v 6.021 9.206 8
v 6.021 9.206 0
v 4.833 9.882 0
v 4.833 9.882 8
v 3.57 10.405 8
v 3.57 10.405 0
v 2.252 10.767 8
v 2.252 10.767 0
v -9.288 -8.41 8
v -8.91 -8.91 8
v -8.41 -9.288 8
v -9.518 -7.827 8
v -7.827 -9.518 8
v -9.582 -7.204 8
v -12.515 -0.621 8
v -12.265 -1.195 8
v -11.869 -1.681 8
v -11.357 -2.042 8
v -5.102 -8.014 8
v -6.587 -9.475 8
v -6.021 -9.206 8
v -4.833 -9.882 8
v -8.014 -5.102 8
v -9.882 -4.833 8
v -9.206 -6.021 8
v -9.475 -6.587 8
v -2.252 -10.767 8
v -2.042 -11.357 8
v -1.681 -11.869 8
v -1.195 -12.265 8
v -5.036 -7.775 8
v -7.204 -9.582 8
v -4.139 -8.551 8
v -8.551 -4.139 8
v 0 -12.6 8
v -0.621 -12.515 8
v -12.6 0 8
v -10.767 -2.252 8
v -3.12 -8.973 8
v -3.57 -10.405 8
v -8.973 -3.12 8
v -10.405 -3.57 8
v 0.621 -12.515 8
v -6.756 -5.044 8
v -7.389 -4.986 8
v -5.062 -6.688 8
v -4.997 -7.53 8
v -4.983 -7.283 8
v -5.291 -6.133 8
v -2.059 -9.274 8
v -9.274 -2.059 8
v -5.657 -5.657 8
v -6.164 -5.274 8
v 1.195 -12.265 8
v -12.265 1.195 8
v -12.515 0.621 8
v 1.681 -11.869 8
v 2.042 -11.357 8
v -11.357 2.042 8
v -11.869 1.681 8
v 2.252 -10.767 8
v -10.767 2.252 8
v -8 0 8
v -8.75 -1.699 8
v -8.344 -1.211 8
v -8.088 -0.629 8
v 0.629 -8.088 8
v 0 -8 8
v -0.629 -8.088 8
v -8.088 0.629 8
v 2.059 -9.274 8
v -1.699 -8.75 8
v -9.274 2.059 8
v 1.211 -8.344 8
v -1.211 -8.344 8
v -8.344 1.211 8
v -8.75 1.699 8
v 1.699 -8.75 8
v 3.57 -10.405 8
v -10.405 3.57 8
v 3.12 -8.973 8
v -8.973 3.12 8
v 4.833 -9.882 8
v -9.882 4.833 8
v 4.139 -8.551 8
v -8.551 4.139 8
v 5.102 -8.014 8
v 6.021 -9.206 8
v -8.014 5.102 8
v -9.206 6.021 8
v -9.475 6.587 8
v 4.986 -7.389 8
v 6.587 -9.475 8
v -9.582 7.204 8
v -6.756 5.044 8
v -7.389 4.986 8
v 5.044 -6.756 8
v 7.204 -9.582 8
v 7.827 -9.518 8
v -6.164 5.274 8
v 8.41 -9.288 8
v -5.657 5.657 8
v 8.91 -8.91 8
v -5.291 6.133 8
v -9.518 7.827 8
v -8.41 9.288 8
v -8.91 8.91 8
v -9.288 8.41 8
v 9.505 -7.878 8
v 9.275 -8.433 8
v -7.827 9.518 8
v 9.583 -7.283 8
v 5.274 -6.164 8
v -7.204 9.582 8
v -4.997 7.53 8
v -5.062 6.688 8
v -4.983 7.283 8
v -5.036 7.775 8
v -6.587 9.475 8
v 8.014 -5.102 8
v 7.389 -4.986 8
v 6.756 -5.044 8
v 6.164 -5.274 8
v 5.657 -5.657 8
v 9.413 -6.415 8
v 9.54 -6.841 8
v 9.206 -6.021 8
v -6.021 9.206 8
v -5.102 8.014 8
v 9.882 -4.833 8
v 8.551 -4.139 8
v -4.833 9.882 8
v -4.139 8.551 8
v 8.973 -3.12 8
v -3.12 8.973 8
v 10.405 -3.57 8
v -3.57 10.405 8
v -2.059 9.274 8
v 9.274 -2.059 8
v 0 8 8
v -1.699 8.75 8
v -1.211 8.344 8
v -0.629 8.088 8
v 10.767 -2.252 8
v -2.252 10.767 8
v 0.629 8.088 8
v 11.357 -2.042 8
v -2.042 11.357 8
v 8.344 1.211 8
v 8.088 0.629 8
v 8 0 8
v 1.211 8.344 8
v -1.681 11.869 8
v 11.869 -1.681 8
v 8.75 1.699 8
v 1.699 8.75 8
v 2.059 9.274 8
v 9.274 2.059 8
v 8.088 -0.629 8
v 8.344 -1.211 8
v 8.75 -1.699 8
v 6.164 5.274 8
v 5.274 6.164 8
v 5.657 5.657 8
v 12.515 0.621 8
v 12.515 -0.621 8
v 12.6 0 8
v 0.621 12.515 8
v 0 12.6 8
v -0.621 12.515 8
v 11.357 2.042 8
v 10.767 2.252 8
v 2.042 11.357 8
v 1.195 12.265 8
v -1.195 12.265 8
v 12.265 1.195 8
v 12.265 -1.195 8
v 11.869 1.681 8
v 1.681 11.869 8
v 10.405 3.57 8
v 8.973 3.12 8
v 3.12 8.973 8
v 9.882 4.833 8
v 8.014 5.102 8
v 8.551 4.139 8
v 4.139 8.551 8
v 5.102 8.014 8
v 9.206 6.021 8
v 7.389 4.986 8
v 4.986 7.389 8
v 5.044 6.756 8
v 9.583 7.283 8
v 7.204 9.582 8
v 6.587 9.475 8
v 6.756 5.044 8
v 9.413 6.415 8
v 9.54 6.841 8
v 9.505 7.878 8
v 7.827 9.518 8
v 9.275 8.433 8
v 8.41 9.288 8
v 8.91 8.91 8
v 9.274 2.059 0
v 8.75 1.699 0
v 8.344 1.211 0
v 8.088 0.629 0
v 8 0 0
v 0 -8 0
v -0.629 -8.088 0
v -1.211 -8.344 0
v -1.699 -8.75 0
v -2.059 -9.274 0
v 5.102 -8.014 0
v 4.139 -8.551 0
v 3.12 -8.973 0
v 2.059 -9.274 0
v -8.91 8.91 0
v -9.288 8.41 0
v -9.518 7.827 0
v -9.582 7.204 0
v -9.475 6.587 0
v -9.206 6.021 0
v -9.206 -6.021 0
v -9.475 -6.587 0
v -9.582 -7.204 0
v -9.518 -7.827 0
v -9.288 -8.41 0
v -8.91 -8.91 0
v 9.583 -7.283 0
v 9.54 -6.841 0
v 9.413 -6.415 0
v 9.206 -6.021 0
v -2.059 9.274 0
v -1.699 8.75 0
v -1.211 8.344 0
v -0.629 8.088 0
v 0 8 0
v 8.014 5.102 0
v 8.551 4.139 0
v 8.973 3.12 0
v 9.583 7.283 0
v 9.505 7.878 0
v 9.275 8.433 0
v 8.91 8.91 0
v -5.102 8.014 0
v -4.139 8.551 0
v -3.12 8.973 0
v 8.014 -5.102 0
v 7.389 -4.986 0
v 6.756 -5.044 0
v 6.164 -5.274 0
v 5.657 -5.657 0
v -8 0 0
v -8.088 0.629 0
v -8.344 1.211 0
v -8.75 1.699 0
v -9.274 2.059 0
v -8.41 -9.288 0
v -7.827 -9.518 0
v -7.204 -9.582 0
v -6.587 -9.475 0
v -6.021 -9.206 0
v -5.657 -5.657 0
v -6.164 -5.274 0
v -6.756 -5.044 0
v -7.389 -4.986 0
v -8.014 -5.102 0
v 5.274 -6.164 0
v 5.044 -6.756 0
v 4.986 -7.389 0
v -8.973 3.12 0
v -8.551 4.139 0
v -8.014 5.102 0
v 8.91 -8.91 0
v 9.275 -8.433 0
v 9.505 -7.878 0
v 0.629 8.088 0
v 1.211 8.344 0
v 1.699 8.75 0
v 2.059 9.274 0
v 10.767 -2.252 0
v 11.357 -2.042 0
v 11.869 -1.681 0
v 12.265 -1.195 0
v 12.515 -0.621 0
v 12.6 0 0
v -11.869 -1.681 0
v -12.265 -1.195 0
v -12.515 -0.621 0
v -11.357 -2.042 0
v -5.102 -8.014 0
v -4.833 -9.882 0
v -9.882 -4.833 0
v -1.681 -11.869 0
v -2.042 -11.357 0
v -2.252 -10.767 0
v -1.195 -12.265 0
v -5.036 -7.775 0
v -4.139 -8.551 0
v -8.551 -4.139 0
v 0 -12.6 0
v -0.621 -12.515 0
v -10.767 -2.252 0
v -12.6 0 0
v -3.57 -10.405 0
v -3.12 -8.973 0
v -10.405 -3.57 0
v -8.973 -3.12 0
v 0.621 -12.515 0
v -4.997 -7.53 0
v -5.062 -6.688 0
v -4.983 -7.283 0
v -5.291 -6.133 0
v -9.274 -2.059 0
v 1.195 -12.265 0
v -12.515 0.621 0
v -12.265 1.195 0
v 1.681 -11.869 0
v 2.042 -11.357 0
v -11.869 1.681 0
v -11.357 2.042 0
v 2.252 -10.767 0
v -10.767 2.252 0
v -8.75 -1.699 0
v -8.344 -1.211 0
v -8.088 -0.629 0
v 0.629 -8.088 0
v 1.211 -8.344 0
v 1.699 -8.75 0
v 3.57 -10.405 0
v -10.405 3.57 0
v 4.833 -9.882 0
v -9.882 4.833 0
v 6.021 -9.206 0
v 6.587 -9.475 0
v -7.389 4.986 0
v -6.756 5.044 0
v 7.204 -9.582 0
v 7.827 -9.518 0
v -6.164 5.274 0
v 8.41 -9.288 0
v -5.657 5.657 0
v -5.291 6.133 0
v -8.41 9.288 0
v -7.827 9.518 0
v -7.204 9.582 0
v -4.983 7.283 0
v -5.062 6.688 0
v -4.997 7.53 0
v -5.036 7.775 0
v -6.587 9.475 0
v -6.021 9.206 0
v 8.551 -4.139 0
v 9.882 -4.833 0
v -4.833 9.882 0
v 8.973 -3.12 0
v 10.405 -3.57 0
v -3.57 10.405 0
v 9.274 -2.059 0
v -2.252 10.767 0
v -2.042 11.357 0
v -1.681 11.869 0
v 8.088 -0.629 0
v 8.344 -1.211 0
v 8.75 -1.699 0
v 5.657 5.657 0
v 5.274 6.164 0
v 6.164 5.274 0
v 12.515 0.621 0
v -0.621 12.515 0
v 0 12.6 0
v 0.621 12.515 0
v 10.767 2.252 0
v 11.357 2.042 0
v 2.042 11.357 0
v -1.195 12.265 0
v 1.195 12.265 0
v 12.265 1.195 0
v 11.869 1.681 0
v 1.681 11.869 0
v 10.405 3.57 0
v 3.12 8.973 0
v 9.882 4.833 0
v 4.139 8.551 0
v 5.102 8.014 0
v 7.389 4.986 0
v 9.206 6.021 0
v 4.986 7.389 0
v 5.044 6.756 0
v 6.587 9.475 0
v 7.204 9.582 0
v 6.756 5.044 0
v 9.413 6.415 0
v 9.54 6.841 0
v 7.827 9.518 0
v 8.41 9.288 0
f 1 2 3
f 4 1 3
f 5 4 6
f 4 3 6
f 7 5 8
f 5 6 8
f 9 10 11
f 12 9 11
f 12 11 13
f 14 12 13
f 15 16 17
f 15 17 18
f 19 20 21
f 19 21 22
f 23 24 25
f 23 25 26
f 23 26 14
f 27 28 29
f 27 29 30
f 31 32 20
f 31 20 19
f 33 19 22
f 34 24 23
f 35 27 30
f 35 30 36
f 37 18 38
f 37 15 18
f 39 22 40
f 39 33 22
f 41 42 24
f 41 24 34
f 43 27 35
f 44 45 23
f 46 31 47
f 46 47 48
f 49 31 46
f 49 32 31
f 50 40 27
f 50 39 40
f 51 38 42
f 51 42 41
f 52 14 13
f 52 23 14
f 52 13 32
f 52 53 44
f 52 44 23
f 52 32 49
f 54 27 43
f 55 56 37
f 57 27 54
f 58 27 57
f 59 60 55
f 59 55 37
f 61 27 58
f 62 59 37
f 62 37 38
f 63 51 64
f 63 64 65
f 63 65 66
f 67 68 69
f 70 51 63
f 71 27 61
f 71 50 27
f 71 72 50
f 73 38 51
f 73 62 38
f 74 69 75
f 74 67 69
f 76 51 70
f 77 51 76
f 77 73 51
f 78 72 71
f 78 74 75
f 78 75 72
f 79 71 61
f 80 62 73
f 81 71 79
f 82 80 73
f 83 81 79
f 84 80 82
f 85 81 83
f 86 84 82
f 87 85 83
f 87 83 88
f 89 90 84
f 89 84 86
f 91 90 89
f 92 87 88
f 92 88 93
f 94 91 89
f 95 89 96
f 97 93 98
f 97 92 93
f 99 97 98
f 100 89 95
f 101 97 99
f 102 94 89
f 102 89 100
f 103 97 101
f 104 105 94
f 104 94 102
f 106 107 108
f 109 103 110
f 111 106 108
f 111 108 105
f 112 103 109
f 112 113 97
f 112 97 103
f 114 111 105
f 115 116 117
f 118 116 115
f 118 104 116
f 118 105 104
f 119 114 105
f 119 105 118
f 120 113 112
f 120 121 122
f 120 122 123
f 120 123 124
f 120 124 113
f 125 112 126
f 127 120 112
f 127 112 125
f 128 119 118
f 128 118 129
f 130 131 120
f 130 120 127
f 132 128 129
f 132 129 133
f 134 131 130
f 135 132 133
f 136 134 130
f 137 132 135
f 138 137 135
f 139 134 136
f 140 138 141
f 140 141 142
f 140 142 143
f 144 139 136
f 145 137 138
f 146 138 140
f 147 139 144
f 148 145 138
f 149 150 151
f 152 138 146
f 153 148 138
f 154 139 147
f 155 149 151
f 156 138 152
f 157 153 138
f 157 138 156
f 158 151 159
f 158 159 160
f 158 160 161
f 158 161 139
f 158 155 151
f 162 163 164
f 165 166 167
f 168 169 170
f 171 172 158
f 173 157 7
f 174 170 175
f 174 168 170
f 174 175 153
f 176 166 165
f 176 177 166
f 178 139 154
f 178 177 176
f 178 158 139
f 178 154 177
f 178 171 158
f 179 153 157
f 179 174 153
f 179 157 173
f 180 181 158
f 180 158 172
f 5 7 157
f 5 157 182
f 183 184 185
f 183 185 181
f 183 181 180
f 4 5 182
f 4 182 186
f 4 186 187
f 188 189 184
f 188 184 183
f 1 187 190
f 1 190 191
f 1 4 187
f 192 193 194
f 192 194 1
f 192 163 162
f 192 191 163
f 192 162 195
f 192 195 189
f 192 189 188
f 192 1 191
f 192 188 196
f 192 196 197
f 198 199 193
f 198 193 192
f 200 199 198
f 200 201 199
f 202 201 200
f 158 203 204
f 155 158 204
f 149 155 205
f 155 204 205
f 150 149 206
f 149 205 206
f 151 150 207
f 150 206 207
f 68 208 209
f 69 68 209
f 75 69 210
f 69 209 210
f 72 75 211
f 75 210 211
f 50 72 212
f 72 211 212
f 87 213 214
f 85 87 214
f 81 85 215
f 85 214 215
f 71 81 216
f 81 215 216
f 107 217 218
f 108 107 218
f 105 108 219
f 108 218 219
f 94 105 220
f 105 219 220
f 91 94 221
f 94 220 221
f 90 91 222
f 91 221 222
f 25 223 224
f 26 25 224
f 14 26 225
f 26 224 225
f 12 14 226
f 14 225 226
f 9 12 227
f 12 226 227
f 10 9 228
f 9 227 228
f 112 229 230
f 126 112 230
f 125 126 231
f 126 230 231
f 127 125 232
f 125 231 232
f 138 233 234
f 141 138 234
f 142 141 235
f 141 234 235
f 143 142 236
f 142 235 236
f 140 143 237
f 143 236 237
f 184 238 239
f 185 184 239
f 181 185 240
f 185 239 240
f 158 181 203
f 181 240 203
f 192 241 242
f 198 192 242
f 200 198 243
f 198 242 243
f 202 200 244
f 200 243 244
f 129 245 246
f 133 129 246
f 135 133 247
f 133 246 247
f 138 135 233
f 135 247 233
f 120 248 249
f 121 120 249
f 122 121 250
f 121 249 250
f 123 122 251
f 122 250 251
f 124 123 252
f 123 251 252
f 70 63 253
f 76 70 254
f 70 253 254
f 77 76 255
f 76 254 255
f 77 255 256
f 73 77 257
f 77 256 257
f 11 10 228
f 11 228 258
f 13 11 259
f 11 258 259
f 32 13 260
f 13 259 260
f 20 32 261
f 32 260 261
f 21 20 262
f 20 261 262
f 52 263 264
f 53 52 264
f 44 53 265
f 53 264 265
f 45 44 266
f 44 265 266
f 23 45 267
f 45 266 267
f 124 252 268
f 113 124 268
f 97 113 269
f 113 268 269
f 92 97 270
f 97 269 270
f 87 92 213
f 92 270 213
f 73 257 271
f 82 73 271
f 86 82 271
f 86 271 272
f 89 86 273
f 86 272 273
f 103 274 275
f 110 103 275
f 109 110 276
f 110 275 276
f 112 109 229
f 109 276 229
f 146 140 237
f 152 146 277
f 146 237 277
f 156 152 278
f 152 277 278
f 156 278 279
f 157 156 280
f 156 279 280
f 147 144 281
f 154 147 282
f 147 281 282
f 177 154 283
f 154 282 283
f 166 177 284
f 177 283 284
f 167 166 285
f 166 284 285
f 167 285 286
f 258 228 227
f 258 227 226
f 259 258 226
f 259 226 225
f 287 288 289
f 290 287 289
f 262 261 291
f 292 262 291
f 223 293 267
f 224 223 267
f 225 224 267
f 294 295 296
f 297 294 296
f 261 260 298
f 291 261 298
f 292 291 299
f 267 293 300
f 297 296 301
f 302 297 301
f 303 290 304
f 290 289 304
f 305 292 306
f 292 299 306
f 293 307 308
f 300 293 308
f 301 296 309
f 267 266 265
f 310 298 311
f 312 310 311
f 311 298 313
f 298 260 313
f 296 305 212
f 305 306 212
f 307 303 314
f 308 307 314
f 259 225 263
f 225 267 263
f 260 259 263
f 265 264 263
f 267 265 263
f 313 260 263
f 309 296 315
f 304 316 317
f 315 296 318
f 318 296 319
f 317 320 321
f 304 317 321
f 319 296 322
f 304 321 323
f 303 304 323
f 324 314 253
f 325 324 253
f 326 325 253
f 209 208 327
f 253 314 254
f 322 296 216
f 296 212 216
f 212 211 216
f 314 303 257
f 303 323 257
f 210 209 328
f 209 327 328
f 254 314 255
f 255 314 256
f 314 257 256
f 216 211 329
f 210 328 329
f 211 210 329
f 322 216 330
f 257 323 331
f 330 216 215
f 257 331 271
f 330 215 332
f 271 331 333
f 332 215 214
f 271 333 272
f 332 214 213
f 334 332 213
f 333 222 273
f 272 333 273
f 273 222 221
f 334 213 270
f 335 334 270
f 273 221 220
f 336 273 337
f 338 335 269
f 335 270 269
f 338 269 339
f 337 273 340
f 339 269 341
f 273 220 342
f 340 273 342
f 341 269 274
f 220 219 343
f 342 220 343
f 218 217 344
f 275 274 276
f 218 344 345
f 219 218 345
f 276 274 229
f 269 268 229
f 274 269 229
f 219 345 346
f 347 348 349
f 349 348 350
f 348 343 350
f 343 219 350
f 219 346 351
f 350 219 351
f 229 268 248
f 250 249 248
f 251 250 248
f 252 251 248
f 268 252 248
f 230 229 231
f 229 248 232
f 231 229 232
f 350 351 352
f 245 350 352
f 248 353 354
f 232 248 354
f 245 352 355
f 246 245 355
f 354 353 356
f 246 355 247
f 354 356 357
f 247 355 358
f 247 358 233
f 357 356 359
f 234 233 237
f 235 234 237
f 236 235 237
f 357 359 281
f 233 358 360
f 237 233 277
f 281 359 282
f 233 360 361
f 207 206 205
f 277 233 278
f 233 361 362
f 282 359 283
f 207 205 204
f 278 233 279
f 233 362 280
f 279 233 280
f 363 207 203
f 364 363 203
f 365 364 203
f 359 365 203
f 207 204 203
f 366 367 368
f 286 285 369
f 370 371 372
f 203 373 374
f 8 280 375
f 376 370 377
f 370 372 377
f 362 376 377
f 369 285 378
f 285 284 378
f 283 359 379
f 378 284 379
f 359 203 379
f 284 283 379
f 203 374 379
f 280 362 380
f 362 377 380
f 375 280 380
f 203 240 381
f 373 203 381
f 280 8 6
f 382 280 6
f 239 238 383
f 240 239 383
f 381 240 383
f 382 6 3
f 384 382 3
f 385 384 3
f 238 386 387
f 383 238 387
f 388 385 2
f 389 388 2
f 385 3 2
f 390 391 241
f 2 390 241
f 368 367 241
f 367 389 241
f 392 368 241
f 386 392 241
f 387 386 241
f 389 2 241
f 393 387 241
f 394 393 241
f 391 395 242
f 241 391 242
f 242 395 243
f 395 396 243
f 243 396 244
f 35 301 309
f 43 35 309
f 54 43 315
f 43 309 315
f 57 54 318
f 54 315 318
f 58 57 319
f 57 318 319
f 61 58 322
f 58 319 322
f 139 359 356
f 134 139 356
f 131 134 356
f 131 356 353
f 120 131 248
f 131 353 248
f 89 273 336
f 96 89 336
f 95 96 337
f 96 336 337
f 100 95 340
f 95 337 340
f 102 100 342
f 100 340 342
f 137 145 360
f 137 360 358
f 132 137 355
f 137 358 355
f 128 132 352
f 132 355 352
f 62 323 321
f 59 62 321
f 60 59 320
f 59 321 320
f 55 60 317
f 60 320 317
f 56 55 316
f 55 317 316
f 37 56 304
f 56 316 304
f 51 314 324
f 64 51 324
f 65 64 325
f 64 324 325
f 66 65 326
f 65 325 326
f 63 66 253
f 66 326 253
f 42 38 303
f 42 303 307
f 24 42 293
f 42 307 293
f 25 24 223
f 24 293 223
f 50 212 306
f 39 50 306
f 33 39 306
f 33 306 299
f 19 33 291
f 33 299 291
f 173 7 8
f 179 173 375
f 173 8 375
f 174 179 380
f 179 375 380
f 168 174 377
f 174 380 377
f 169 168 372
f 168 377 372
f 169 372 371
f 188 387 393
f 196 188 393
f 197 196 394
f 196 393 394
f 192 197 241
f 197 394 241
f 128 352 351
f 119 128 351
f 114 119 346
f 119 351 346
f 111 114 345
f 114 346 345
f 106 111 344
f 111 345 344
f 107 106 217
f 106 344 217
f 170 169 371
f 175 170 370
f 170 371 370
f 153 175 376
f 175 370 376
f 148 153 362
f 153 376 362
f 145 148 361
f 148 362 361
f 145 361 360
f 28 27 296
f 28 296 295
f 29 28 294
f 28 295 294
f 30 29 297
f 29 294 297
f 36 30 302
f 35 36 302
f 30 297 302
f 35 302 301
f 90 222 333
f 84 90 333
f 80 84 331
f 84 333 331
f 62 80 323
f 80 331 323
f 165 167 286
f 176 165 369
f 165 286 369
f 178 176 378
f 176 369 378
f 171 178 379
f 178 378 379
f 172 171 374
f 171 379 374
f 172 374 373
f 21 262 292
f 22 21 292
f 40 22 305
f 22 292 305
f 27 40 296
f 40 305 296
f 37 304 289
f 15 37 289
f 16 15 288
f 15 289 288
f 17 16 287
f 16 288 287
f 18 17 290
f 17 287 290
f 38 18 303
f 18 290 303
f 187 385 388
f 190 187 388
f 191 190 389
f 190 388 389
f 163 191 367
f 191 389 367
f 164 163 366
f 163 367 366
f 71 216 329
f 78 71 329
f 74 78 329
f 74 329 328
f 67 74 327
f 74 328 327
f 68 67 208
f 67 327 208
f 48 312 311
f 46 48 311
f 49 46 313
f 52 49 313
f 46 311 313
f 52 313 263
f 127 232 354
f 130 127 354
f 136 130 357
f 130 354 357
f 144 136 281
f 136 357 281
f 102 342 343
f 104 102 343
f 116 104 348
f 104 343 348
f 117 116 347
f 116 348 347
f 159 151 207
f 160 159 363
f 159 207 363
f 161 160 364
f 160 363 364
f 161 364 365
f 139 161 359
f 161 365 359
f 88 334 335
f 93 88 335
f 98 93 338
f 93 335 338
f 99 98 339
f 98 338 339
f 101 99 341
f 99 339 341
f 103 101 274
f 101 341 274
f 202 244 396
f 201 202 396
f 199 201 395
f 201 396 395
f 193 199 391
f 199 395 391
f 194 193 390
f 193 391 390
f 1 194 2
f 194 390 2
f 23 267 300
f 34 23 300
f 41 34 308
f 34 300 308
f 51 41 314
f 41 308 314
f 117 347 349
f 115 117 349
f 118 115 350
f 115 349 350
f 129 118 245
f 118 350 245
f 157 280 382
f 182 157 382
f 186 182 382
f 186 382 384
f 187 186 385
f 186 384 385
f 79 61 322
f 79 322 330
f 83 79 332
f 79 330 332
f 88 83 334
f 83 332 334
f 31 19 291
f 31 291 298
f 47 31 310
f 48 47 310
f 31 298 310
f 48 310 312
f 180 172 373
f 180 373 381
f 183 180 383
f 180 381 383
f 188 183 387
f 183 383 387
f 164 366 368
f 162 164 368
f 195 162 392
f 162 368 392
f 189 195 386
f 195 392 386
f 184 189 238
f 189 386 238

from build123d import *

# Parameters (mm, degrees)
F1_DEPTH = 8


with BuildPart() as f1:
    # F0 (on Top) → F1 (new body)
    with BuildSketch(Plane.XY):
        with BuildLine():
            ThreePointArc((2.2520923755, 10.7669902913), (1.4518819391, 12.0838270193), (0, 12.6))
            ThreePointArc((0, 12.6), (-1.4518819391, 12.0838270193), (-2.2520923755, 10.7669902913))
            ThreePointArc((-2.2520923755, 10.7669902913), (0, 11), (2.2520923755, 10.7669902913))
        make_face()
        with BuildLine():
            ThreePointArc((2.3, 10.3), (2.2879917465, 10.5347206172), (2.2520923755, 10.7669902913))
            ThreePointArc((2.2520923755, 10.7669902913), (0, 11), (-2.2520923755, 10.7669902913))
            ThreePointArc((-2.2520923755, 10.7669902913), (-2.2809196167, 10.0043554464), (-2.0586116077, 9.2742718447))
            ThreePointArc((-2.0586116077, 9.2742718447), (0, 9.5), (2.0586116077, 9.2742718447))
            ThreePointArc((2.0586116077, 9.2742718447), (2.2388397327, 9.7731255831), (2.3, 10.3))
        make_face()
        with BuildLine():
            ThreePointArc((2.0586116077, 9.2742718447), (0, 9.5), (-2.0586116077, 9.2742718447))
            ThreePointArc((-2.0586116077, 9.2742718447), (-1.210542284, 8.34434477), (0, 8))
            ThreePointArc((0, 8), (1.210542284, 8.34434477), (2.0586116077, 9.2742718447))
        make_face()
        with BuildLine():
            ThreePointArc((-2.0586116077, 9.2742718447), (-2.2809196167, 10.0043554464), (-2.2520923755, 10.7669902913))
            ThreePointArc((-2.2520923755, 10.7669902913), (-4.209517756, 10.1626748576), (-6.0209420573, 9.2058816385))
            ThreePointArc((-6.0209420573, 9.2058816385), (-5.4612938492, 8.6870013059), (-5.1022422843, 8.0135587396))
            ThreePointArc((-5.1022422843, 8.0135587396), (-3.6354926075, 8.7768555589), (-2.0586116077, 9.2742718447))
        make_face()
        with BuildLine():
            ThreePointArc((-6.0209420573, 9.2058816385), (-7.5179204749, 9.5711915915), (-8.9095454592, 8.9095454267))
            ThreePointArc((-8.9095454592, 8.9095454267), (-9.5711915938, 7.5179204521), (-9.2058816385, 6.0209420573))
            ThreePointArc((-9.2058816385, 6.0209420573), (-7.7781745931, 7.7781745931), (-6.0209420573, 9.2058816385))
        make_face()
        with BuildLine():
            ThreePointArc((-5.1022422843, 8.0135587396), (-5.4612938492, 8.6870013059), (-6.0209420573, 9.2058816385))
            ThreePointArc((-6.0209420573, 9.2058816385), (-7.7781745931, 7.7781745931), (-9.2058816385, 6.0209420573))
            ThreePointArc((-9.2058816385, 6.0209420573), (-8.6870013059, 5.4612938492), (-8.0135587396, 5.1022422843))
            ThreePointArc((-8.0135587396, 5.1022422843), (-6.7175144213, 6.7175144213), (-5.1022422843, 8.0135587396))
        make_face()
        with BuildLine():
            ThreePointArc((-4.9831998462, 7.2831998462), (-5.0131555303, 7.6531982297), (-5.1022422843, 8.0135587396))
            ThreePointArc((-5.1022422843, 8.0135587396), (-6.7175144213, 6.7175144213), (-8.0135587396, 5.1022422843))
            ThreePointArc((-8.0135587396, 5.1022422843), (-6.7563254348, 5.0443601122), (-5.6568542575, 5.6568542415))
            ThreePointArc((-5.6568542575, 5.6568542415), (-5.1582769236, 6.4030279466), (-4.9831998462, 7.2831998462))
        make_face()
        with BuildLine():
            ThreePointArc((-8.0135587396, 5.1022422843), (-8.6870013059, 5.4612938492), (-9.2058816385, 6.0209420573))
            ThreePointArc((-9.2058816385, 6.0209420573), (-10.1626748576, 4.209517756), (-10.7669902913, 2.2520923755))
            ThreePointArc((-10.7669902913, 2.2520923755), (-10.0043554464, 2.2809196167), (-9.2742718447, 2.0586116077))
            ThreePointArc((-9.2742718447, 2.0586116077), (-8.7768555589, 3.6354926075), (-8.0135587396, 5.1022422843))
        make_face()
        with BuildLine():
            ThreePointArc((-10.7669902913, 2.2520923755), (-12.0838270121, 1.451881948), (-12.6, 2.3e-08))
            ThreePointArc((-12.6, 2.3e-08), (-12.0838270266, -1.4518819302), (-10.7669902913, -2.2520923755))
            ThreePointArc((-10.7669902913, -2.2520923755), (-11, 0), (-10.7669902913, 2.2520923755))
        make_face()
        with BuildLine():
            ThreePointArc((-9.2742718447, 2.0586116077), (-10.0043554464, 2.2809196167), (-10.7669902913, 2.2520923755))
            ThreePointArc((-10.7669902913, 2.2520923755), (-11, 0), (-10.7669902913, -2.2520923755))
            ThreePointArc((-10.7669902913, -2.2520923755), (-10.0043554464, -2.2809196167), (-9.2742718447, -2.0586116077))
            ThreePointArc((-9.2742718447, -2.0586116077), (-9.5, 0), (-9.2742718447, 2.0586116077))
        make_face()
        with BuildLine():
            ThreePointArc((-8, 0), (-8.34434477, 1.210542284), (-9.2742718447, 2.0586116077))
            ThreePointArc((-9.2742718447, 2.0586116077), (-9.5, 0), (-9.2742718447, -2.0586116077))
            ThreePointArc((-9.2742718447, -2.0586116077), (-8.34434477, -1.210542284), (-8, 0))
        make_face()
        with BuildLine():
            ThreePointArc((-10.7669902913, -2.2520923755), (-10.1626748576, -4.209517756), (-9.2058816385, -6.0209420573))
            ThreePointArc((-9.2058816385, -6.0209420573), (-8.6870013059, -5.4612938492), (-8.0135587396, -5.1022422843))
            ThreePointArc((-8.0135587396, -5.1022422843), (-8.7768555589, -3.6354926075), (-9.2742718447, -2.0586116077))
            ThreePointArc((-9.2742718447, -2.0586116077), (-10.0043554464, -2.2809196167), (-10.7669902913, -2.2520923755))
        make_face()
        with BuildLine():
            ThreePointArc((-9.2058816385, -6.0209420573), (-9.5711915942, -7.5179204484), (-8.9095454644, -8.9095454215))
            ThreePointArc((-8.9095454644, -8.9095454215), (-7.5179204785, -9.5711915911), (-6.0209420573, -9.2058816385))
            ThreePointArc((-6.0209420573, -9.2058816385), (-7.7781745931, -7.7781745931), (-9.2058816385, -6.0209420573))
        make_face()
        with BuildLine():
            ThreePointArc((-8.0135587396, -5.1022422843), (-8.6870013059, -5.4612938492), (-9.2058816385, -6.0209420573))
            ThreePointArc((-9.2058816385, -6.0209420573), (-7.7781745931, -7.7781745931), (-6.0209420573, -9.2058816385))
            ThreePointArc((-6.0209420573, -9.2058816385), (-5.4612938492, -8.6870013059), (-5.1022422843, -8.0135587396))
            ThreePointArc((-5.1022422843, -8.0135587396), (-6.7175144213, -6.7175144213), (-8.0135587396, -5.1022422843))
        make_face()
        with BuildLine():
            ThreePointArc((-5.6568542412, -5.6568542578), (-6.7563254237, -5.0443601148), (-8.0135587396, -5.1022422843))
            ThreePointArc((-8.0135587396, -5.1022422843), (-6.7175144213, -6.7175144213), (-5.1022422843, -8.0135587396))
            ThreePointArc((-5.1022422843, -8.0135587396), (-5.0131555303, -7.6531982297), (-4.9831998462, -7.2831998462))
            ThreePointArc((-4.9831998462, -7.2831998462), (-5.1582769192, -6.4030279572), (-5.6568542412, -5.6568542578))
        make_face()
        with BuildLine():
            ThreePointArc((-6.0209420573, -9.2058816385), (-4.209517756, -10.1626748576), (-2.2520923755, -10.7669902913))
            ThreePointArc((-2.2520923755, -10.7669902913), (-2.2809196167, -10.0043554464), (-2.0586116077, -9.2742718447))
            ThreePointArc((-2.0586116077, -9.2742718447), (-3.6354926075, -8.7768555589), (-5.1022422843, -8.0135587396))
            ThreePointArc((-5.1022422843, -8.0135587396), (-5.4612938492, -8.6870013059), (-6.0209420573, -9.2058816385))
        make_face()
        with BuildLine():
            ThreePointArc((-4.9e-09, -8), (-1.2105422861, -8.3443447713), (-2.0586116077, -9.2742718447))
            ThreePointArc((-2.0586116077, -9.2742718447), (0, -9.5), (2.0586116077, -9.2742718447))
            ThreePointArc((2.0586116077, -9.2742718447), (1.2105422819, -8.3443447687), (-4.9e-09, -8))
        make_face()
        with BuildLine():
            ThreePointArc((-2.0586116077, -9.2742718447), (-2.2809196167, -10.0043554464), (-2.2520923755, -10.7669902913))
            ThreePointArc((-2.2520923755, -10.7669902913), (0, -11), (2.2520923755, -10.7669902913))
            ThreePointArc((2.2520923755, -10.7669902913), (2.2879917465, -10.5347206172), (2.3, -10.3))
            ThreePointArc((2.3, -10.3), (2.2388397327, -9.7731255831), (2.0586116077, -9.2742718447))
            ThreePointArc((2.0586116077, -9.2742718447), (0, -9.5), (-2.0586116077, -9.2742718447))
        make_face()
        with BuildLine():
            ThreePointArc((-2.2520923755, -10.7669902913), (-1.4518819339, -12.0838270236), (1.34e-08, -12.6))
            ThreePointArc((1.34e-08, -12.6), (1.4518819443, -12.0838270151), (2.2520923755, -10.7669902913))
            ThreePointArc((2.2520923755, -10.7669902913), (0, -11), (-2.2520923755, -10.7669902913))
        make_face()
        with BuildLine():
            ThreePointArc((2.2520923755, -10.7669902913), (4.209517756, -10.1626748576), (6.0209420573, -9.2058816385))
            ThreePointArc((6.0209420573, -9.2058816385), (5.4612938492, -8.6870013059), (5.1022422843, -8.0135587396))
            ThreePointArc((5.1022422843, -8.0135587396), (3.6354926075, -8.7768555589), (2.0586116077, -9.2742718447))
            ThreePointArc((2.0586116077, -9.2742718447), (2.2388397327, -9.7731255831), (2.3, -10.3))
            ThreePointArc((2.3, -10.3), (2.2879917465, -10.5347206172), (2.2520923755, -10.7669902913))
        make_face()
        with BuildLine():
            ThreePointArc((5.6568542641, -5.6568542349), (5.0443601159, -6.7563254193), (5.1022422843, -8.0135587396))
            ThreePointArc((5.1022422843, -8.0135587396), (6.7175144213, -6.7175144213), (8.0135587396, -5.1022422843))
            ThreePointArc((8.0135587396, -5.1022422843), (6.7563254394, -5.0443601111), (5.6568542641, -5.6568542349))
        make_face()
        with BuildLine():
            ThreePointArc((5.1022422843, -8.0135587396), (5.4612938492, -8.6870013059), (6.0209420573, -9.2058816385))
            ThreePointArc((6.0209420573, -9.2058816385), (7.7781745931, -7.7781745931), (9.2058816385, -6.0209420573))
            ThreePointArc((9.2058816385, -6.0209420573), (8.6870013059, -5.4612938492), (8.0135587396, -5.1022422843))
            ThreePointArc((8.0135587396, -5.1022422843), (6.7175144213, -6.7175144213), (5.1022422843, -8.0135587396))
        make_face()
        with BuildLine():
            ThreePointArc((6.0209420573, -9.2058816385), (7.5179204711, -9.5711915919), (8.9095454539, -8.909545432))
            ThreePointArc((8.9095454539, -8.909545432), (9.408122774, -8.1633717335), (9.5831998462, -7.2831998462))
            ThreePointArc((9.5831998462, -7.2831998462), (9.4868522828, -6.6244768856), (9.2058816385, -6.0209420573))
            ThreePointArc((9.2058816385, -6.0209420573), (7.7781745931, -7.7781745931), (6.0209420573, -9.2058816385))
        make_face()
        with BuildLine():
            ThreePointArc((9.2058816385, -6.0209420573), (10.1626748576, -4.209517756), (10.7669902913, -2.2520923755))
            ThreePointArc((10.7669902913, -2.2520923755), (10.0043554464, -2.2809196167), (9.2742718447, -2.0586116077))
            ThreePointArc((9.2742718447, -2.0586116077), (8.7768555589, -3.6354926075), (8.0135587396, -5.1022422843))
            ThreePointArc((8.0135587396, -5.1022422843), (8.6870013059, -5.4612938492), (9.2058816385, -6.0209420573))
        make_face()
        with BuildLine():
            ThreePointArc((10.7669902913, -2.2520923755), (12.0838270193, -1.4518819391), (12.6, 0))
            ThreePointArc((12.6, 0), (12.0838270193, 1.4518819391), (10.7669902913, 2.2520923755))
            ThreePointArc((10.7669902913, 2.2520923755), (10.9415925076, 1.1320571532), (11, 0))
            ThreePointArc((11, 0), (10.9415925076, -1.1320571532), (10.7669902913, -2.2520923755))
        make_face()
        with BuildLine():
            ThreePointArc((11, 0), (10.9415925076, 1.1320571532), (10.7669902913, 2.2520923755))
            ThreePointArc((10.7669902913, 2.2520923755), (10.0043554464, 2.2809196167), (9.2742718447, 2.0586116077))
            ThreePointArc((9.2742718447, 2.0586116077), (9.4433993489, 1.0354751266), (9.5, 0))
            ThreePointArc((9.5, 0), (9.4433993489, -1.0354751266), (9.2742718447, -2.0586116077))
            ThreePointArc((9.2742718447, -2.0586116077), (10.0043554464, -2.2809196167), (10.7669902913, -2.2520923755))
            ThreePointArc((10.7669902913, -2.2520923755), (10.9415925076, -1.1320571532), (11, 0))
        make_face()
        with BuildLine():
            ThreePointArc((9.5, 0), (9.4433993489, 1.0354751266), (9.2742718447, 2.0586116077))
            ThreePointArc((9.2742718447, 2.0586116077), (8.34434477, 1.210542284), (8, 0))
            ThreePointArc((8, 0), (8.34434477, -1.210542284), (9.2742718447, -2.0586116077))
            ThreePointArc((9.2742718447, -2.0586116077), (9.4433993489, -1.0354751266), (9.5, 0))
        make_face()
        with BuildLine():
            ThreePointArc((9.2742718447, 2.0586116077), (10.0043554464, 2.2809196167), (10.7669902913, 2.2520923755))
            ThreePointArc((10.7669902913, 2.2520923755), (10.1626748576, 4.209517756), (9.2058816385, 6.0209420573))
            ThreePointArc((9.2058816385, 6.0209420573), (8.6870013059, 5.4612938492), (8.0135587396, 5.1022422843))
            ThreePointArc((8.0135587396, 5.1022422843), (8.7768555589, 3.6354926075), (9.2742718447, 2.0586116077))
        make_face()
        with BuildLine():
            ThreePointArc((9.5831998462, 7.2831998462), (9.408122771, 8.1633717407), (8.909545443, 8.909545443))
            ThreePointArc((8.909545443, 8.909545443), (7.5179204635, 9.5711915927), (6.0209420573, 9.2058816385))
            ThreePointArc((6.0209420573, 9.2058816385), (7.7781745931, 7.7781745931), (9.2058816385, 6.0209420573))
            ThreePointArc((9.2058816385, 6.0209420573), (9.4868522828, 6.6244768856), (9.5831998462, 7.2831998462))
        make_face()
        with BuildLine():
            ThreePointArc((9.2058816385, 6.0209420573), (7.7781745931, 7.7781745931), (6.0209420573, 9.2058816385))
            ThreePointArc((6.0209420573, 9.2058816385), (5.4612938492, 8.6870013059), (5.1022422843, 8.0135587396))
            ThreePointArc((5.1022422843, 8.0135587396), (6.7175144213, 6.7175144213), (8.0135587396, 5.1022422843))
            ThreePointArc((8.0135587396, 5.1022422843), (8.6870013059, 5.4612938492), (9.2058816385, 6.0209420573))
        make_face()
        with BuildLine():
            ThreePointArc((8.0135587396, 5.1022422843), (6.7175144213, 6.7175144213), (5.1022422843, 8.0135587396))
            ThreePointArc((5.1022422843, 8.0135587396), (5.0443601135, 6.7563254294), (5.6568542495, 5.6568542495))
            ThreePointArc((5.6568542495, 5.6568542495), (6.7563254294, 5.0443601135), (8.0135587396, 5.1022422843))
        make_face()
        with BuildLine():
            ThreePointArc((5.1022422843, 8.0135587396), (5.4612938492, 8.6870013059), (6.0209420573, 9.2058816385))
            ThreePointArc((6.0209420573, 9.2058816385), (4.209517756, 10.1626748576), (2.2520923755, 10.7669902913))
            ThreePointArc((2.2520923755, 10.7669902913), (2.2879917465, 10.5347206172), (2.3, 10.3))
            ThreePointArc((2.3, 10.3), (2.2388397327, 9.7731255831), (2.0586116077, 9.2742718447))
            ThreePointArc((2.0586116077, 9.2742718447), (3.6354926075, 8.7768555589), (5.1022422843, 8.0135587396))
        make_face()
    extrude(amount=F1_DEPTH)


solid = f1.part
